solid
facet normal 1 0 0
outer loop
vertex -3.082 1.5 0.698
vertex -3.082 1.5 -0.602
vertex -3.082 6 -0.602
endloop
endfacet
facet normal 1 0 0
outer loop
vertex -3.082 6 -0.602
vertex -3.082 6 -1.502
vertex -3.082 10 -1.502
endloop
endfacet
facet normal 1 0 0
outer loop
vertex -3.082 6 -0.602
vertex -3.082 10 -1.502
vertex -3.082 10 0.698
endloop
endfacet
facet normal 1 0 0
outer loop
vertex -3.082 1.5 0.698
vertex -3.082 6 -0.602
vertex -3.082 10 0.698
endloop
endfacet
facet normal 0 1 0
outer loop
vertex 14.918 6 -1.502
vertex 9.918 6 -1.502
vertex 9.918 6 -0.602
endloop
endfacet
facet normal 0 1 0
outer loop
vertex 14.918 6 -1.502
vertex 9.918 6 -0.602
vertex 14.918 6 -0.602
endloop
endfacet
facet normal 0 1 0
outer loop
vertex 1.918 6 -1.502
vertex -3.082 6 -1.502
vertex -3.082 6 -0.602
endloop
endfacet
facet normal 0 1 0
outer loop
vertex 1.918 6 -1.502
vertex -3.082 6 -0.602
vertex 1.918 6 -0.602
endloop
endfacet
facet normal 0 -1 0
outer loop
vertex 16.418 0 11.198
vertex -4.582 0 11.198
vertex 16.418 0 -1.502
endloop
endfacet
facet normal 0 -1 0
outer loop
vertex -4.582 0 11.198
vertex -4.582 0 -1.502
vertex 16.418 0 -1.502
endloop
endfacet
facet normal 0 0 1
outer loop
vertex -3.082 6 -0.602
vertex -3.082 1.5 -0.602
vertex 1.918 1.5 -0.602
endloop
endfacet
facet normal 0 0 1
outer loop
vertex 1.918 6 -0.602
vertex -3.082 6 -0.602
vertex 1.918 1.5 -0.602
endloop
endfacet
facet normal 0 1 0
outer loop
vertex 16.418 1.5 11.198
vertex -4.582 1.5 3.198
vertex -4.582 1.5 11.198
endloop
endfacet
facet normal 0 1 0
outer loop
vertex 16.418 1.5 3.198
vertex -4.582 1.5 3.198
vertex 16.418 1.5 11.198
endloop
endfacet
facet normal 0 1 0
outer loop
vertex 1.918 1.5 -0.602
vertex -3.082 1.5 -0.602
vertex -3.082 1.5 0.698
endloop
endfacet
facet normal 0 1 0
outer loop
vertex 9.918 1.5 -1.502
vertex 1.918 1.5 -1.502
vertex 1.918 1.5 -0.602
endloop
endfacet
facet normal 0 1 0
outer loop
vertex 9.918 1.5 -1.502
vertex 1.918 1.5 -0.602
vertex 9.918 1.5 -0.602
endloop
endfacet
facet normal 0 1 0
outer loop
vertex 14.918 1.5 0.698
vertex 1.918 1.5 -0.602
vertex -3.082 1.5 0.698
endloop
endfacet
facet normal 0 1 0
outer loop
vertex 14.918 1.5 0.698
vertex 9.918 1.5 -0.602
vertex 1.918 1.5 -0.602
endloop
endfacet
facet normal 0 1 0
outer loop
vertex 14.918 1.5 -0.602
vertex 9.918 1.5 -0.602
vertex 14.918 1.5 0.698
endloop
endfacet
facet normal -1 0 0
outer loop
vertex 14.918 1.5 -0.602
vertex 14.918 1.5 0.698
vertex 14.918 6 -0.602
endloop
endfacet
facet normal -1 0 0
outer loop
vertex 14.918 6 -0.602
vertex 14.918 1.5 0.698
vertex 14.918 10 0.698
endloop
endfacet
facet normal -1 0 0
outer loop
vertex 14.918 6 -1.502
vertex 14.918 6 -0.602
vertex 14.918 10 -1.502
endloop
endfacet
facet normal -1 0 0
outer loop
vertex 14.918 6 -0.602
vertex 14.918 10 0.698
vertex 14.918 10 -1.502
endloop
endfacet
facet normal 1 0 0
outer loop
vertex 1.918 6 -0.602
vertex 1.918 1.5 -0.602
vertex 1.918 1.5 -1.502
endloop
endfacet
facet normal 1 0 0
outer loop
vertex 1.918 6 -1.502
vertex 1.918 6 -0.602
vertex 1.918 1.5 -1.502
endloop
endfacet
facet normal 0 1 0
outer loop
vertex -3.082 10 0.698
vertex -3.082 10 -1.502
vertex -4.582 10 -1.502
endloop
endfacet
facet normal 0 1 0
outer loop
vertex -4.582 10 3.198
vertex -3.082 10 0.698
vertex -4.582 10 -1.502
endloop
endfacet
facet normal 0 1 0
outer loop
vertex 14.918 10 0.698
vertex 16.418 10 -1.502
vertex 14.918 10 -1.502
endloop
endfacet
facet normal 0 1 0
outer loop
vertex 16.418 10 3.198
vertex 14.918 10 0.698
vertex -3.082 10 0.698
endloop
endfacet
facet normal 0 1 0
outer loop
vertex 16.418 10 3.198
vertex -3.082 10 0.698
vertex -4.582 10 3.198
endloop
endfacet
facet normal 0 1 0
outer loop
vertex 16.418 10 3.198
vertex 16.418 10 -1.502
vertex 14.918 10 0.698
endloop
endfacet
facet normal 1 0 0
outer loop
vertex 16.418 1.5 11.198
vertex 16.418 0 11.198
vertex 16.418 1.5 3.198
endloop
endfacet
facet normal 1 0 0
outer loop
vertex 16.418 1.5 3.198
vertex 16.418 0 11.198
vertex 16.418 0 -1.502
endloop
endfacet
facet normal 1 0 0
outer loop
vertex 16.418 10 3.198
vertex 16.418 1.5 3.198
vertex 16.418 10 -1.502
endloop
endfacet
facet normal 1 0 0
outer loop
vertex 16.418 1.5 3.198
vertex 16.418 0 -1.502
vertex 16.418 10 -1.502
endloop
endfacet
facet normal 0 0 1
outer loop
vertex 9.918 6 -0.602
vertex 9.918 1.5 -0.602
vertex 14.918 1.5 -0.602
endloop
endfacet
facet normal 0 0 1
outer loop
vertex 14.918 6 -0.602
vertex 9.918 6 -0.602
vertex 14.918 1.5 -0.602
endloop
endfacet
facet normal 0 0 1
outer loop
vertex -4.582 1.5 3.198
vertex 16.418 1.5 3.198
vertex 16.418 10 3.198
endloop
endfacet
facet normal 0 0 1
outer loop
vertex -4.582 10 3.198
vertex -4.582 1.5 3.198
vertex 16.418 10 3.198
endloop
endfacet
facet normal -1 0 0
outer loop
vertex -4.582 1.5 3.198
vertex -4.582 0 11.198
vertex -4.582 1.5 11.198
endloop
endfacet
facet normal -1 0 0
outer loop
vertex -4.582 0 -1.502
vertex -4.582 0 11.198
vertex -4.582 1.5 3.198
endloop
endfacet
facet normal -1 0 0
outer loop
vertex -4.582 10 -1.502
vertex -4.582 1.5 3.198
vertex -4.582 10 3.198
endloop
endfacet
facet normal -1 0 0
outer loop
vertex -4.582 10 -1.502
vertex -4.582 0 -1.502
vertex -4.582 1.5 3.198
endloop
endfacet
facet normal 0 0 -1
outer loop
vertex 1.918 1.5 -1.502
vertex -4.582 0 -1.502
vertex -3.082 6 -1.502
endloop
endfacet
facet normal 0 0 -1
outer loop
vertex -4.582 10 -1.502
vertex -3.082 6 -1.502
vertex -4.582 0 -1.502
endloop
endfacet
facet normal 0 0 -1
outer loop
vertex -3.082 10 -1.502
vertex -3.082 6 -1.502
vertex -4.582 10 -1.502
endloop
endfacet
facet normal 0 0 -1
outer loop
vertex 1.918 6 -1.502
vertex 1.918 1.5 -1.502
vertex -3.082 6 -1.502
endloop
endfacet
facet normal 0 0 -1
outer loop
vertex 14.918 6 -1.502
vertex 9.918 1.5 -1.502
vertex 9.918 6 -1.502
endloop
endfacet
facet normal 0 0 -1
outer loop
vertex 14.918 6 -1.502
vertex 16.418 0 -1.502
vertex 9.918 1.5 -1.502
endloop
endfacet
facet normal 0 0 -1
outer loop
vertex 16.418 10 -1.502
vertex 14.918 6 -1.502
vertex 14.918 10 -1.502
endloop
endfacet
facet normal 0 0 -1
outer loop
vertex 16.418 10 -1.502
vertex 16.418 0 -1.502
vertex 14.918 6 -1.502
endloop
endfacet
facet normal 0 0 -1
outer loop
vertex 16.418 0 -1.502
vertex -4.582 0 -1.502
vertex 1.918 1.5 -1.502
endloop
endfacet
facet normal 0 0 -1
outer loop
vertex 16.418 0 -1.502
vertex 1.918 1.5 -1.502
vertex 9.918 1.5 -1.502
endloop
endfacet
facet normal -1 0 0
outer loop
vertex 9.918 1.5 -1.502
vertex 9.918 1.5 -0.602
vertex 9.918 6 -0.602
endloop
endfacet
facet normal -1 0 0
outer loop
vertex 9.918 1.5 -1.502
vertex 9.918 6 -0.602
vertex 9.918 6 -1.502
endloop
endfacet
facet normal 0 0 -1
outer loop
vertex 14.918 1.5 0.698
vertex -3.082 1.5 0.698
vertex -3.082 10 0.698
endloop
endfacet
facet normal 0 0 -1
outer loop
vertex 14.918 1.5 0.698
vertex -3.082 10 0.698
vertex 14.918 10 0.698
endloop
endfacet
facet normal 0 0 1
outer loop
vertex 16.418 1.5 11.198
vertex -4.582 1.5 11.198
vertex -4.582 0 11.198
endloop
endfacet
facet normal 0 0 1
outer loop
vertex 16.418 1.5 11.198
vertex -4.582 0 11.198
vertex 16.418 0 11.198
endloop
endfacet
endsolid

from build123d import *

# Parameters (mm, degrees)
SKETCH1_W           = 18
SKETCH1_H           = 4.7
BOSS_EXTRUDE1_DEPTH = 1.5
SKETCH2_W           = 5
SKETCH2_H           = 0.9
SKETCH2_W_2         = 18
SKETCH2_H_2         = 2.5
BOSS_EXTRUDE2_DEPTH = 4.5
SKETCH3_W           = 18
SKETCH3_H           = 2.5
BOSS_EXTRUDE3_DEPTH = 4
SKETCH4_W           = 4.7
SKETCH4_H           = 10
BOSS_EXTRUDE4_DEPTH = 1.5
SKETCH5_W           = 4.7
SKETCH5_H           = 10
BOSS_EXTRUDE5_DEPTH = 1.5
SKETCH6_W           = 21
SKETCH6_H           = 1.5
BOSS_EXTRUDE6_DEPTH = 8


with BuildPart() as part:
    # Sketch1 → Boss-Extrude1 (new body)
    with BuildSketch(Plane(origin=(0, 0, 0), x_dir=(1, 0, 0), z_dir=(0, 1, 0))):
        with Locations((5.918454936, -0.847854077)):
            Rectangle(SKETCH1_W, SKETCH1_H)
    extrude(amount=BOSS_EXTRUDE1_DEPTH)

    # Sketch2 → Boss-Extrude2 (add)
    with BuildSketch(Plane(origin=(0, 1.5, 0), x_dir=(1, 0, 0), z_dir=(0, 1, 0))):
        with Locations((-0.581545064, 1.052145923)):
            Rectangle(SKETCH2_W, SKETCH2_H)
        with Locations((12.418454936, 1.052145923)):
            Rectangle(SKETCH2_W, SKETCH2_H)
        with Locations((5.918454936, -1.947854077)):
            Rectangle(SKETCH2_W_2, SKETCH2_H_2)
    extrude(amount=BOSS_EXTRUDE2_DEPTH)

    # Sketch3 → Boss-Extrude3 (add)
    with BuildSketch(Plane(origin=(0, 6, 0), x_dir=(1, 0, 0), z_dir=(0, 1, 0))):
        with Locations((5.918454936, -1.947854077)):
            Rectangle(SKETCH3_W, SKETCH3_H)
    extrude(amount=BOSS_EXTRUDE3_DEPTH)

    # Sketch4 → Boss-Extrude4 (add)
    with BuildSketch(Plane(origin=(14.918454936, 0, 0), x_dir=(0, 0, -1), z_dir=(1, 0, 0))):
        with Locations((-0.847854077, 5)):
            Rectangle(SKETCH4_W, SKETCH4_H)
    extrude(amount=BOSS_EXTRUDE4_DEPTH)

    # Sketch5 → Boss-Extrude5 (add)
    with BuildSketch(Plane.ZY.offset(3.081545064)):
        with Locations((0.847854077, 5)):
            Rectangle(SKETCH5_W, SKETCH5_H)
    extrude(amount=BOSS_EXTRUDE5_DEPTH)

    # Sketch6 → Boss-Extrude6 (add)
    with BuildSketch(Plane.XY.offset(3.197854077)):
        with Locations((5.918454936, 0.75)):
            Rectangle(SKETCH6_W, SKETCH6_H)
    extrude(amount=BOSS_EXTRUDE6_DEPTH)


solid = part.part
